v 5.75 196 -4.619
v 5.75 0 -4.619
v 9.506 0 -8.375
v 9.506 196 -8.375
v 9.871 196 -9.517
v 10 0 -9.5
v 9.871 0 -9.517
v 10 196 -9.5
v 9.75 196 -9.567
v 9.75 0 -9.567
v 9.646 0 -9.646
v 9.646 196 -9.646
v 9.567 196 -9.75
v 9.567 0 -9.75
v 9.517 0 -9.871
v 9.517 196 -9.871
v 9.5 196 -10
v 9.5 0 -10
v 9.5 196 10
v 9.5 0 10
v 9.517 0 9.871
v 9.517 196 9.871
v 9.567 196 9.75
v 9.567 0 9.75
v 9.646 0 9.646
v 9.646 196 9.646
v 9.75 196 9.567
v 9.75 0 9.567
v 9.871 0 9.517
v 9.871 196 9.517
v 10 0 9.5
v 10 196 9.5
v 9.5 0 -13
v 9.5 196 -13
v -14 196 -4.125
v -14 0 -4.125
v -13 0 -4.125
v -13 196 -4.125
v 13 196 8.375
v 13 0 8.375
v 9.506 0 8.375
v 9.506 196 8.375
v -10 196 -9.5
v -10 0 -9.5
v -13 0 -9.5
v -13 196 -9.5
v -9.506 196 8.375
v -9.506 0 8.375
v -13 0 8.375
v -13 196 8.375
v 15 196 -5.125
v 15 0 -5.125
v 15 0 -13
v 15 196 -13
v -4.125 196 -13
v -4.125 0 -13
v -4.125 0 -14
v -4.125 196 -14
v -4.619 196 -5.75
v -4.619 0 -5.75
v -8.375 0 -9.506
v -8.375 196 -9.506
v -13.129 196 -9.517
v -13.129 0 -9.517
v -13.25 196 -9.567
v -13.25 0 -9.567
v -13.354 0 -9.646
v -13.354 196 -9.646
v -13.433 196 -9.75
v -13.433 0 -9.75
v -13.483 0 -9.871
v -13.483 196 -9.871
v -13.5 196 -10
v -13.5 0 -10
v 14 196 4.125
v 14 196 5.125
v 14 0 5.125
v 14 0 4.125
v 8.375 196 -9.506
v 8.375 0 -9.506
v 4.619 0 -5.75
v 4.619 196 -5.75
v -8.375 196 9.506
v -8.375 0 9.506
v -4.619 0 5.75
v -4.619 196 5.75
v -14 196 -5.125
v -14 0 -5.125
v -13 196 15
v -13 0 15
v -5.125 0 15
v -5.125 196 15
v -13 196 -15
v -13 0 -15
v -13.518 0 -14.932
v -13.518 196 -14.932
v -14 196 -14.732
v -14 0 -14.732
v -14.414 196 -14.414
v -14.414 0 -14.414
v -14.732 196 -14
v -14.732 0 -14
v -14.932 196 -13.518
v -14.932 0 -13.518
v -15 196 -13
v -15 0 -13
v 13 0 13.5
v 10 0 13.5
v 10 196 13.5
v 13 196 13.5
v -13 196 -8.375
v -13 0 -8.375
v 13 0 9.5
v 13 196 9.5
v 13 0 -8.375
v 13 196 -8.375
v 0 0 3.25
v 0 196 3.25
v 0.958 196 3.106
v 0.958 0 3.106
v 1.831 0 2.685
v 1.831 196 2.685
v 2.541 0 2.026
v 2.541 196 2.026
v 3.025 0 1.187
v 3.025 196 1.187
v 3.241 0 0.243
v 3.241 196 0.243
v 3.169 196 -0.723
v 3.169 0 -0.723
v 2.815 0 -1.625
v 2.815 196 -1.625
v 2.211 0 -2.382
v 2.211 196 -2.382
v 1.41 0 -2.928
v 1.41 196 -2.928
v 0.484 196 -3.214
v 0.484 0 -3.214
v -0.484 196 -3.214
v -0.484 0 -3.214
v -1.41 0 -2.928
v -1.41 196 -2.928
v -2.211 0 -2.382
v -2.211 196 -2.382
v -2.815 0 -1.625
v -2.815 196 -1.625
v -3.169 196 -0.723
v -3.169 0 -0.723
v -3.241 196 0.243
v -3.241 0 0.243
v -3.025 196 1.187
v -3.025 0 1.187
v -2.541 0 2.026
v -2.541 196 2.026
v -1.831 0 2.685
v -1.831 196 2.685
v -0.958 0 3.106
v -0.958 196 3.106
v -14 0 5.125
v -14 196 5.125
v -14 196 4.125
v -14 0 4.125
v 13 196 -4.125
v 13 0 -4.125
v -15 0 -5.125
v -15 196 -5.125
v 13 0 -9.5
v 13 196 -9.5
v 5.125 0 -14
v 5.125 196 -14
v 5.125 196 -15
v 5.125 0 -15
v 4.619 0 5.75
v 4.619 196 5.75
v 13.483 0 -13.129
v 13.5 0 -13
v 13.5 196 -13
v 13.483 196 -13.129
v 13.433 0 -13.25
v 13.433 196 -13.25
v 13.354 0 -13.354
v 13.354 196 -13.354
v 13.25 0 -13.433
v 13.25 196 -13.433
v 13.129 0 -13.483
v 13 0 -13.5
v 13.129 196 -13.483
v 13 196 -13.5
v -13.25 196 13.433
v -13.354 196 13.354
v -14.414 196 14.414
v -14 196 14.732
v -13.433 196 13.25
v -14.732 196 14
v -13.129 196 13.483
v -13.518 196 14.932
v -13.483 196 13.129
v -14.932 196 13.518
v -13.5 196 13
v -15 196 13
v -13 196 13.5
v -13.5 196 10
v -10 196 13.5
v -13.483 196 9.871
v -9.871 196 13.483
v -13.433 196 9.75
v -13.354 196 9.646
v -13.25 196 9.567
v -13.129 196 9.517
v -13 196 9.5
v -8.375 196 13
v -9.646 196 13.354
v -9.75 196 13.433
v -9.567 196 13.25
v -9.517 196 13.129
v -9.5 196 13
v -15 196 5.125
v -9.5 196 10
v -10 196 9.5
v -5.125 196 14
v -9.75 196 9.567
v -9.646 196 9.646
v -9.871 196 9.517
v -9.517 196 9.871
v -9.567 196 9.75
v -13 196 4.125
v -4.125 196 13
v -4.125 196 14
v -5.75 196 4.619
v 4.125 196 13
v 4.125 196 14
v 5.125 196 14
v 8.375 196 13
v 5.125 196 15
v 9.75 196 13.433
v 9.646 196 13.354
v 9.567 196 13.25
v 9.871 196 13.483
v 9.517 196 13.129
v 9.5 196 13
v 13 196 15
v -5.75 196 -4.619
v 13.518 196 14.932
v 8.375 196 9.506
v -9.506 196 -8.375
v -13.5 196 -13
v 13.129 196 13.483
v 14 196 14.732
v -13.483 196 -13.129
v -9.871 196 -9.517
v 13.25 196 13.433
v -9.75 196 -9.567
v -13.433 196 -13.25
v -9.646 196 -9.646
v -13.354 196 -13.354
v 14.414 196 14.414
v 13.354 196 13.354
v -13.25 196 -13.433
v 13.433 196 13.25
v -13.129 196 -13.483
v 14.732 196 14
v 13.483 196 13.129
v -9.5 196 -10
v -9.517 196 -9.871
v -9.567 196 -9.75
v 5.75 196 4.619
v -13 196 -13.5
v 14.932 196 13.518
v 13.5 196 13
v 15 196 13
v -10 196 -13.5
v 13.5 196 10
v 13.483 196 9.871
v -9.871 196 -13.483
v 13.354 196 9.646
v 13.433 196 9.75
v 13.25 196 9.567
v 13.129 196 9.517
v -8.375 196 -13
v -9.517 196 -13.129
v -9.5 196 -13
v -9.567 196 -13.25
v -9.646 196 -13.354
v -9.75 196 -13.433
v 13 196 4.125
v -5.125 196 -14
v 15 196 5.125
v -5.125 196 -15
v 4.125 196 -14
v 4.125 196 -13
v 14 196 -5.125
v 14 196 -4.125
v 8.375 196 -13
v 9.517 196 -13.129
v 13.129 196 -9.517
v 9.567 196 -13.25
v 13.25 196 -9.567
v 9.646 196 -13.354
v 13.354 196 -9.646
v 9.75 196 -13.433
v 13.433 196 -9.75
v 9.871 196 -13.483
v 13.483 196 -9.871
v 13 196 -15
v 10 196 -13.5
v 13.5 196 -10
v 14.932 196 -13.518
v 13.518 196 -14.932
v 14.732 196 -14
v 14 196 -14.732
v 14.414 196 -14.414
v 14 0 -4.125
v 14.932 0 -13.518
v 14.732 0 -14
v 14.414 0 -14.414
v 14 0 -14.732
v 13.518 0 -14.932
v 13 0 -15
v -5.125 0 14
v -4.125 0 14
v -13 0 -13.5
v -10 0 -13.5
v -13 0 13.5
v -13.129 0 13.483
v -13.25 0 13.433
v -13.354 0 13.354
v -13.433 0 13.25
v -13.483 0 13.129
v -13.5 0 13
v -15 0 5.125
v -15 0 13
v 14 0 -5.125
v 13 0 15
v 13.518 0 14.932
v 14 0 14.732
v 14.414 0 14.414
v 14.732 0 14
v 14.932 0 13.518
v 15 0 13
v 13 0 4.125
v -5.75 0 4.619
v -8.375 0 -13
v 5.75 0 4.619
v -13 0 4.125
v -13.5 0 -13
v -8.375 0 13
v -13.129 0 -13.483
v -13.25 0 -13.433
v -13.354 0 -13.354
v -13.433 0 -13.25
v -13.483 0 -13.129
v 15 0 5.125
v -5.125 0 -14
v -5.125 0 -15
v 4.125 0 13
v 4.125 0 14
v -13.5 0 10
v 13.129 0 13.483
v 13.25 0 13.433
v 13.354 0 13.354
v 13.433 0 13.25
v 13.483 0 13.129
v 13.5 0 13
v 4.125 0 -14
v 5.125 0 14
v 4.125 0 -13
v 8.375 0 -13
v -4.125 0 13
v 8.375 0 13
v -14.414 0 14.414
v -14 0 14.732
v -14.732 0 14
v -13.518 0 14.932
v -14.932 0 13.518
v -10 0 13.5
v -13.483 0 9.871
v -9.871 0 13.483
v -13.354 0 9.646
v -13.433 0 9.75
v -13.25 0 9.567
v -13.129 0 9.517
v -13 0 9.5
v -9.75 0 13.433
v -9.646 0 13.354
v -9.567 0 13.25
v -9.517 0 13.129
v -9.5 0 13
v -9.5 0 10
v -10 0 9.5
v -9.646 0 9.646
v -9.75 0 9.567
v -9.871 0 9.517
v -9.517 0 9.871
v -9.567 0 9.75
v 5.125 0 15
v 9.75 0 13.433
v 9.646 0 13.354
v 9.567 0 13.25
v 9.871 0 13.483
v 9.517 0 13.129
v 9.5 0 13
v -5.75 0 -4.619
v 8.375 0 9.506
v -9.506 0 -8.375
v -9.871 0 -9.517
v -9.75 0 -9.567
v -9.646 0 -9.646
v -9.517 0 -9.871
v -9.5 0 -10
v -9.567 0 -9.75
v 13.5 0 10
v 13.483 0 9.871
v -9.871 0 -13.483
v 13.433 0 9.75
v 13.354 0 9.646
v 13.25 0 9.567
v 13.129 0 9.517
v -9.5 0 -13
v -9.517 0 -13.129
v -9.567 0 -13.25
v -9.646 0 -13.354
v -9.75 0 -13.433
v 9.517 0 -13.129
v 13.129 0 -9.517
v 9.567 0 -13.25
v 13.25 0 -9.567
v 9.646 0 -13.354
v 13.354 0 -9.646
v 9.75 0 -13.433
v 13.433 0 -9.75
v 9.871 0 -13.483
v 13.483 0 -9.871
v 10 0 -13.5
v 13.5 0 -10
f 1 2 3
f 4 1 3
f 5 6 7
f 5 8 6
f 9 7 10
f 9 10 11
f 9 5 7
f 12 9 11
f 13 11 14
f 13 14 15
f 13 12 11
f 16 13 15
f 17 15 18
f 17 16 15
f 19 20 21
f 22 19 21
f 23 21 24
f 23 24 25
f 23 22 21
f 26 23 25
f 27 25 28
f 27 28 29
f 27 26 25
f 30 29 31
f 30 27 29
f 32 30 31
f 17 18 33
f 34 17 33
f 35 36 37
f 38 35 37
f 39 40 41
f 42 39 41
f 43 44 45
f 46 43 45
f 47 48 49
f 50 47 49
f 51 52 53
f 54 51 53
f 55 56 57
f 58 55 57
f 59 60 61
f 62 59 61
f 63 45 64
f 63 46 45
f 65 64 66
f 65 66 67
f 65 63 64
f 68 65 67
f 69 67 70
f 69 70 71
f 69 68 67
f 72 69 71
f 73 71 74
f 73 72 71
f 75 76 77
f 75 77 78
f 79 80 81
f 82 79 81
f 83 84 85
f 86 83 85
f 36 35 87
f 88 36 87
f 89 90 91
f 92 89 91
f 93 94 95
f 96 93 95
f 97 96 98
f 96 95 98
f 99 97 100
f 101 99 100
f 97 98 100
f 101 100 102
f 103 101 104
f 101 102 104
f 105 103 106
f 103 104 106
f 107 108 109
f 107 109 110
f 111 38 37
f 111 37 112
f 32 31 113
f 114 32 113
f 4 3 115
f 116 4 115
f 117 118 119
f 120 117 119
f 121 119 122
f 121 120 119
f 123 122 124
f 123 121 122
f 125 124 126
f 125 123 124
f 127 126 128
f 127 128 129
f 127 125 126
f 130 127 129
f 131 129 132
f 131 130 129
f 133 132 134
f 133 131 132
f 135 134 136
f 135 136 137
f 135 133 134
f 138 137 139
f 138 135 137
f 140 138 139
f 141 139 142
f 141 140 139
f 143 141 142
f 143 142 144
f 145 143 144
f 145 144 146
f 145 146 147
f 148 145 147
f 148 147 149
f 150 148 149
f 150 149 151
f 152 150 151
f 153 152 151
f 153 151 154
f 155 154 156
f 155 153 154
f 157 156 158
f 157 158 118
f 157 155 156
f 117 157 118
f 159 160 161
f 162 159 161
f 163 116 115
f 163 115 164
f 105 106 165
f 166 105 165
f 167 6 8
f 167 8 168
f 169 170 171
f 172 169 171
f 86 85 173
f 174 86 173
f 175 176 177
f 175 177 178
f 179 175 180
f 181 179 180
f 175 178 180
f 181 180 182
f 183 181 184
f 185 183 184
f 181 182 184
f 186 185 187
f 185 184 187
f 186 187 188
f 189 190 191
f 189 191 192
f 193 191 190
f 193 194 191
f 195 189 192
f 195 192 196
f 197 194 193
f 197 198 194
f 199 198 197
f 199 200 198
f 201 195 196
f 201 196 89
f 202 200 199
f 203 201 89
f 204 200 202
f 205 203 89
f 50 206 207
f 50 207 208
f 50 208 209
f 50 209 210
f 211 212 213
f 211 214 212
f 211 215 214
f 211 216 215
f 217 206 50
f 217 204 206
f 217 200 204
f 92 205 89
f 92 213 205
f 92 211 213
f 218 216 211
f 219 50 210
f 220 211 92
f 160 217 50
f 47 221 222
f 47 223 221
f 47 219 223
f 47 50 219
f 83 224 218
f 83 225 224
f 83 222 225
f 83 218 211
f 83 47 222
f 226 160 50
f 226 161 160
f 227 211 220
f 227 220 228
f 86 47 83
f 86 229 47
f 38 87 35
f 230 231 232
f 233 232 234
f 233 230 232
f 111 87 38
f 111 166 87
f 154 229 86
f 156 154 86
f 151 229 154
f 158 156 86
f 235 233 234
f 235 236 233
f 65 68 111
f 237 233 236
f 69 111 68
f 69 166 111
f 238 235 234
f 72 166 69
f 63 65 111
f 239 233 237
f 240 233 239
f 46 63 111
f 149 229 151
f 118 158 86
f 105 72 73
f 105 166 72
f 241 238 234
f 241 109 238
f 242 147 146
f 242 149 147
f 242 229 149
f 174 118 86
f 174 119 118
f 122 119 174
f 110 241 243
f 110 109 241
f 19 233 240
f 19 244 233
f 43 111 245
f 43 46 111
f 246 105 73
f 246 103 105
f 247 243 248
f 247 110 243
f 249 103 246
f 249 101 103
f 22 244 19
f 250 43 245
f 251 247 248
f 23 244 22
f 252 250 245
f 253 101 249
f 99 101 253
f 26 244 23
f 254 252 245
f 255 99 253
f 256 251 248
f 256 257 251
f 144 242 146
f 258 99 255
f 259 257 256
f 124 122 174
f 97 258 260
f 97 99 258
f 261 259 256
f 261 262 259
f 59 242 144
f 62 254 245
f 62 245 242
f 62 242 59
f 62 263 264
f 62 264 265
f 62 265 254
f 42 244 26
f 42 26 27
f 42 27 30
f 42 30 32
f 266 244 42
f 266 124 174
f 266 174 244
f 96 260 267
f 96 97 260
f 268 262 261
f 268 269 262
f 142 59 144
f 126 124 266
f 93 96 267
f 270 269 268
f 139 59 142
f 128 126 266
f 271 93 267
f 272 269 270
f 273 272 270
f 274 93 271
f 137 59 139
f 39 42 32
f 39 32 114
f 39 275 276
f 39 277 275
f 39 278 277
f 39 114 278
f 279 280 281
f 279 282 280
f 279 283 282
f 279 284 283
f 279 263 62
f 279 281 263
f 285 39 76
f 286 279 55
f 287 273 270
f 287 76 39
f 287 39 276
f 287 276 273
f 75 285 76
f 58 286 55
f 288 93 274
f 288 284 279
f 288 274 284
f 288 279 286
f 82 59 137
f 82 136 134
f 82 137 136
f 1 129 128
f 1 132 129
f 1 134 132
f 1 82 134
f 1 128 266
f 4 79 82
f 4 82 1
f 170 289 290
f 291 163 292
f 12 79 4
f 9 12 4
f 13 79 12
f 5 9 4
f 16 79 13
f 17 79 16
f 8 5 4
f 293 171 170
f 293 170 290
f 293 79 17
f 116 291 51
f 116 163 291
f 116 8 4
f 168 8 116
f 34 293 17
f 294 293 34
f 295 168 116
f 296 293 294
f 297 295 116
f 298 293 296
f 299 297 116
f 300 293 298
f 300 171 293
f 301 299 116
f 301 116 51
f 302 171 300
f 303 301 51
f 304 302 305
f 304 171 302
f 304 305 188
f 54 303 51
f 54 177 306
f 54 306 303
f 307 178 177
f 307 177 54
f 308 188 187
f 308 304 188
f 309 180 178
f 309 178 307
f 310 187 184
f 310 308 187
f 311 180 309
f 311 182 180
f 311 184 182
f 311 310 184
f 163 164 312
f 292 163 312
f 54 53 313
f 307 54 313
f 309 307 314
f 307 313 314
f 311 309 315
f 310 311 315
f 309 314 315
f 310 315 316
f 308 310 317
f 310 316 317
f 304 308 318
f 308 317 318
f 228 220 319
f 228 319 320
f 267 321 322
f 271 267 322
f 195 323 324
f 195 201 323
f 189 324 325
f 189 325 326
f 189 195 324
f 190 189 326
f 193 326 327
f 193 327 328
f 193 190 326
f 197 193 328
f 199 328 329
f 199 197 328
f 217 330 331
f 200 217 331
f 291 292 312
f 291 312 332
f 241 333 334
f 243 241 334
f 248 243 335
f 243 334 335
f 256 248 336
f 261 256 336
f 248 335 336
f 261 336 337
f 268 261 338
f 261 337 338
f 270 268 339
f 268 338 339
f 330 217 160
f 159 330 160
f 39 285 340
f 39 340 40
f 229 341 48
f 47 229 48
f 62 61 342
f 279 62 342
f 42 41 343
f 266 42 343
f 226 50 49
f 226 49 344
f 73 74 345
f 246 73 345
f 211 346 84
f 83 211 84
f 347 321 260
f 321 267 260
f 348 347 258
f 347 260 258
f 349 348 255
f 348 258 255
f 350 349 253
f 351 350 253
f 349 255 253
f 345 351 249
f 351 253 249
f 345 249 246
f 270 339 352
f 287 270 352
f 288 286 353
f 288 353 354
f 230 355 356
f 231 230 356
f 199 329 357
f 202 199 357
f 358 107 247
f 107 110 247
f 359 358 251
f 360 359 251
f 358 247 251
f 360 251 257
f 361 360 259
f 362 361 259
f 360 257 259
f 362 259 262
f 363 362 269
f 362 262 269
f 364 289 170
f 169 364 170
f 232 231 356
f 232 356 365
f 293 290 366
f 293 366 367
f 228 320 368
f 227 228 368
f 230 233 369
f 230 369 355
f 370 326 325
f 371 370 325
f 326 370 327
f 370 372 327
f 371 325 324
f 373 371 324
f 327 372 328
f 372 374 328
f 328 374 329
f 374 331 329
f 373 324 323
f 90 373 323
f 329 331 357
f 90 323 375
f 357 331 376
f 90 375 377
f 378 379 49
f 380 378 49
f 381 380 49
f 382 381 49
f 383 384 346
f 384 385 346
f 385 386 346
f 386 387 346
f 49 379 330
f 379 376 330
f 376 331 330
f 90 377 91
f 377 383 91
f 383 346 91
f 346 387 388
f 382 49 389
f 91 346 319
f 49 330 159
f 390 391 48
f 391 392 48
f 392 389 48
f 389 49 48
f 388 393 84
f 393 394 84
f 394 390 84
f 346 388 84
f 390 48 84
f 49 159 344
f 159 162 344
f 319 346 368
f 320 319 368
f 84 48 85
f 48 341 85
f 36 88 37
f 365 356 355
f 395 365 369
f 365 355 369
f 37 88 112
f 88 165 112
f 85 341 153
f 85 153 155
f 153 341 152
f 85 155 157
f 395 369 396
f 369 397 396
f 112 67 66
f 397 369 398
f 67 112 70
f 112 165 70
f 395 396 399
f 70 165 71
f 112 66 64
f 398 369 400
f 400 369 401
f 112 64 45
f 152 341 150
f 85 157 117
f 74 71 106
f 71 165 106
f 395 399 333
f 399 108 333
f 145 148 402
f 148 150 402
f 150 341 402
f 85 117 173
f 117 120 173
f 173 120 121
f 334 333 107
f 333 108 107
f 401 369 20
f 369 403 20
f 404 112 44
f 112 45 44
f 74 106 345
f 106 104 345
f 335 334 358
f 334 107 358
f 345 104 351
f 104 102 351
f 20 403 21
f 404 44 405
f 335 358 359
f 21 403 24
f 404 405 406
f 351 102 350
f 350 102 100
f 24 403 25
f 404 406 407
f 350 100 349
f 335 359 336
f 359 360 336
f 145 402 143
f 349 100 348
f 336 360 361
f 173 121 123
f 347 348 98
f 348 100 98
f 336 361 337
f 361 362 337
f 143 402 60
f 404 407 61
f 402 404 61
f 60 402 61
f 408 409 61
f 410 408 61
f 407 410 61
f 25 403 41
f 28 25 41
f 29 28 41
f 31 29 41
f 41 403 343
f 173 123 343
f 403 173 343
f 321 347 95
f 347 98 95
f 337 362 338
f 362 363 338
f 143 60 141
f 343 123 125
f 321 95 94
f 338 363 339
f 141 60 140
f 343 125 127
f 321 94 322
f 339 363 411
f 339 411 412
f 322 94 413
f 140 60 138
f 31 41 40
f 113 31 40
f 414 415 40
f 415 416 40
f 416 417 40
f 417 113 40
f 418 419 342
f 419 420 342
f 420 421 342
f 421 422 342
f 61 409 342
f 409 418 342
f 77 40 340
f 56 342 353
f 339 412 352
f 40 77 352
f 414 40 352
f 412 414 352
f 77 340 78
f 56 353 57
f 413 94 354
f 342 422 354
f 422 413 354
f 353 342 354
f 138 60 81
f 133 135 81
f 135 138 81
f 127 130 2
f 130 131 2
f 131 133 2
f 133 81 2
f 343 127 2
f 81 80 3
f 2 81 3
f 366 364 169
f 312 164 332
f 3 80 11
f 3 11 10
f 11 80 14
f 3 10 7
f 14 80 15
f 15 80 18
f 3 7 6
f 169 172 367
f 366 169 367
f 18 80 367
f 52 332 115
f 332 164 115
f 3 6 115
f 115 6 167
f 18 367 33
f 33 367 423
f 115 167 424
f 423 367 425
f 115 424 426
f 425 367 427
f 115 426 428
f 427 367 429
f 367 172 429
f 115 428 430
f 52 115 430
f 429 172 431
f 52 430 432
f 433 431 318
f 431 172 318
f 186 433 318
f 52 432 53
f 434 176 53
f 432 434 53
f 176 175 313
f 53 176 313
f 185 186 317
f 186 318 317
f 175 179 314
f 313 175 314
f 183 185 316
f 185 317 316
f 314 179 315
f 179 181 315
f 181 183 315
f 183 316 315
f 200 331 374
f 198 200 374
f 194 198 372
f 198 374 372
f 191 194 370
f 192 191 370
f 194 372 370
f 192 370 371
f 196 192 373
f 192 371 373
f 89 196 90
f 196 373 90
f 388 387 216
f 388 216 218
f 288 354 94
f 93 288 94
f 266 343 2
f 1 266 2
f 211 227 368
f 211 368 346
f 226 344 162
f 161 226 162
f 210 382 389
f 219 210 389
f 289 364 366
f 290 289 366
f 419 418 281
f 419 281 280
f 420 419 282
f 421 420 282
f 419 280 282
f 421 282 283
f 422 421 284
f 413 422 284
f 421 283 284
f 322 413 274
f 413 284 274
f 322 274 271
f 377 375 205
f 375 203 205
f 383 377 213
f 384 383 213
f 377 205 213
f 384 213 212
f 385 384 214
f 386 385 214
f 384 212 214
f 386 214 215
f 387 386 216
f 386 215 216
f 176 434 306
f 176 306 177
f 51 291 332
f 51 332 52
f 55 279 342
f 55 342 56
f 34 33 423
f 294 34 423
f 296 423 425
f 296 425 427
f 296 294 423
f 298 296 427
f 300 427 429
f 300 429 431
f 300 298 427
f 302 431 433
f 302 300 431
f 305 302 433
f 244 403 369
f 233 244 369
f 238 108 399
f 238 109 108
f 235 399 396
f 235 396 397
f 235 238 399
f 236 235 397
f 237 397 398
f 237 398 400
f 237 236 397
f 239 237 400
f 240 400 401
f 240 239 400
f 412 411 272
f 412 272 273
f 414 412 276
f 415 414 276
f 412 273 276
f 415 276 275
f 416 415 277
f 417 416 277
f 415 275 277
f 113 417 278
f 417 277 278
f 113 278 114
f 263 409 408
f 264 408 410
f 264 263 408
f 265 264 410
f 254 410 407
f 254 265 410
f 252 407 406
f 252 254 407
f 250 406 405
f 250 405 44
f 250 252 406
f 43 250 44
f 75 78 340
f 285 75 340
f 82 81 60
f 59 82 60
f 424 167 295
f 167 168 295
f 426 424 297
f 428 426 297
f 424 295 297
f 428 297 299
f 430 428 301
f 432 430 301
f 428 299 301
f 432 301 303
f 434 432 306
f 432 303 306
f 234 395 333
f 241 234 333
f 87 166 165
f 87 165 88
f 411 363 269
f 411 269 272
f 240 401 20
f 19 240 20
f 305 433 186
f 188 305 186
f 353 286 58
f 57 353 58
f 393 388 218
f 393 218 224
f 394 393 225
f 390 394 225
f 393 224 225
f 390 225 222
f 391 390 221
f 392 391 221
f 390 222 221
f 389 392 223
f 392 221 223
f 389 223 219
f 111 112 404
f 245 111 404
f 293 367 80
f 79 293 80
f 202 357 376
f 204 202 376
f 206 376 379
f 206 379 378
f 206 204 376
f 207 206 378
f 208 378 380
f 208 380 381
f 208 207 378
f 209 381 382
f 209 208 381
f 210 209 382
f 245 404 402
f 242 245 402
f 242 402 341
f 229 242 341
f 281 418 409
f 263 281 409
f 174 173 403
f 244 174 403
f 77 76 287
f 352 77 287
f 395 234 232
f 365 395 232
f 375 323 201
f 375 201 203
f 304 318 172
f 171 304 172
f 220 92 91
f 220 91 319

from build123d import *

# Parameters (mm, degrees)
SKETCH1_W           = 4
SKETCH1_H           = 4
SKETCH1_R           = 3.25
BOSS_EXTRUDE1_DEPTH = 196
SKETCH2_W           = 1
SKETCH2_H           = 1
CUT_EXTRUDE1_DEPTH  = 198.144616969
FILLET1_R           = 0.5


with BuildPart() as part:
    # Sketch1 → Boss-Extrude1 (new body)
    with BuildSketch(Plane(origin=(0, 0, 0), x_dir=(1, 0, 0), z_dir=(0, 1, 0))):
        with BuildLine():
            Line((-8.375, 9.50637085), (-8.375, 13))
            Line((-8.375, 13), (-4.125, 13))
            Line((-4.125, 13), (-4.125, 15))
            Line((-4.125, 15), (-13, 15))
            ThreePointArc((-13, 15), (-14.414213562, 14.414213562), (-15, 13))
            Line((-15, 13), (-15, 4.125))
            Line((-15, 4.125), (-13, 4.125))
            Line((-13, 4.125), (-13, 8.375))
            Line((-13, 8.375), (-9.50637085, 8.375))
            Line((-9.50637085, 8.375), (-5.75, 4.61862915))
            Line((-5.75, 4.61862915), (-5.75, -4.61862915))
            Line((-5.75, -4.61862915), (-9.50637085, -8.375))
            Line((-9.50637085, -8.375), (-13, -8.375))
            Line((-13, -8.375), (-13, -4.125))
            Line((-13, -4.125), (-15, -4.125))
            Line((-15, -4.125), (-15, -13))
            ThreePointArc((-15, -13), (-14.414213562, -14.414213562), (-13, -15))
            Line((-13, -15), (-4.125, -15))
            Line((-4.125, -15), (-4.125, -13))
            Line((-4.125, -13), (-8.375, -13))
            Line((-8.375, -13), (-8.375, -9.50637085))
            Line((-8.375, -9.50637085), (-4.61862915, -5.75))
            Line((-4.61862915, -5.75), (4.61862915, -5.75))
            Line((4.61862915, -5.75), (8.375, -9.50637085))
            Line((8.375, -9.50637085), (8.375, -13))
            Line((8.375, -13), (4.125, -13))
            Line((4.125, -13), (4.125, -15))
            Line((4.125, -15), (13, -15))
            ThreePointArc((13, -15), (14.414213562, -14.414213562), (15, -13))
            Line((15, -13), (15, -4.125))
            Line((15, -4.125), (13, -4.125))
            Line((13, -4.125), (13, -8.375))
            Line((13, -8.375), (9.50637085, -8.375))
            Line((9.50637085, -8.375), (5.75, -4.61862915))
            Line((5.75, -4.61862915), (5.75, 4.61862915))
            Line((5.75, 4.61862915), (9.50637085, 8.375))
            Line((9.50637085, 8.375), (13, 8.375))
            Line((13, 8.375), (13, 4.125))
            Line((13, 4.125), (15, 4.125))
            Line((15, 4.125), (15, 13))
            ThreePointArc((15, 13), (14.414213562, 14.414213562), (13, 15))
            Line((13, 15), (4.125, 15))
            Line((4.125, 15), (4.125, 13))
            Line((4.125, 13), (8.375, 13))
            Line((8.375, 13), (8.375, 9.50637085))
            Line((8.375, 9.50637085), (4.61862915, 5.75))
            Line((4.61862915, 5.75), (-4.61862915, 5.75))
            Line((-4.61862915, 5.75), (-8.375, 9.50637085))
        make_face()
        with Locations((-11.5, -11.5)):
            Rectangle(SKETCH1_W, SKETCH1_H, mode=Mode.SUBTRACT)
        with Locations((11.5, -11.5)):
            Rectangle(SKETCH1_W, SKETCH1_H, mode=Mode.SUBTRACT)
        Polygon((-9.5, 9.5), (-10.63137085, 9.5), (-13.5, 9.5), (-13.5, 13.5), (-9.5, 13.5), align=None, mode=Mode.SUBTRACT)
        with Locations(Location((0, 0, 0), (0, 0, 270))):
            Circle(SKETCH1_R, mode=Mode.SUBTRACT)
        with Locations((11.5, 11.5)):
            Rectangle(SKETCH1_W, SKETCH1_H, mode=Mode.SUBTRACT)
    extrude(amount=BOSS_EXTRUDE1_DEPTH)

    # Sketch2 → Cut-Extrude1 (cut, through all)
    with BuildSketch(Plane(origin=(0, 196, 0), x_dir=(1, 0, 0), z_dir=(0, 1, 0))):
        with Locations((14.5, 4.625)):
            Rectangle(SKETCH2_W, SKETCH2_H)
        with Locations((-4.625, 14.5)):
            Rectangle(SKETCH2_W, SKETCH2_H)
        with Locations((4.625, 14.5)):
            Rectangle(SKETCH2_W, SKETCH2_H)
        with Locations((14.5, -4.625)):
            Rectangle(SKETCH2_W, SKETCH2_H)
        with Locations((4.625, -14.5)):
            Rectangle(SKETCH2_W, SKETCH2_H)
        with Locations((-4.625, -14.5)):
            Rectangle(SKETCH2_W, SKETCH2_H)
        with Locations((-14.5, -4.625)):
            Rectangle(SKETCH2_W, SKETCH2_H)
        with Locations((-14.5, 4.625)):
            Rectangle(SKETCH2_W, SKETCH2_H)
    extrude(amount=-CUT_EXTRUDE1_DEPTH, mode=Mode.SUBTRACT)

    # Fillet1
    fillet1_edges = [part.edges().sort_by_distance(p)[0] for p in [
        (-9.5, 98, -13.5),
        (-13.5, 98, -13.5),
        (-13.5, 98, -9.5),
        (-9.5, 98, -9.5),
        (-9.5, 98, 9.5),
        (-13.5, 98, 9.5),
        (-13.5, 98, 13.5),
        (-9.5, 98, 13.5),
        (9.5, 98, -9.5),
        (13.5, 98, -9.5),
        (13.5, 98, -13.5),
        (9.5, 98, -13.5),
        (13.5, 98, 13.5),
        (13.5, 98, 9.5),
        (9.5, 98, 9.5),
        (9.5, 98, 13.5),
    ]]
    fillet(fillet1_edges, radius=FILLET1_R)


solid = part.part
